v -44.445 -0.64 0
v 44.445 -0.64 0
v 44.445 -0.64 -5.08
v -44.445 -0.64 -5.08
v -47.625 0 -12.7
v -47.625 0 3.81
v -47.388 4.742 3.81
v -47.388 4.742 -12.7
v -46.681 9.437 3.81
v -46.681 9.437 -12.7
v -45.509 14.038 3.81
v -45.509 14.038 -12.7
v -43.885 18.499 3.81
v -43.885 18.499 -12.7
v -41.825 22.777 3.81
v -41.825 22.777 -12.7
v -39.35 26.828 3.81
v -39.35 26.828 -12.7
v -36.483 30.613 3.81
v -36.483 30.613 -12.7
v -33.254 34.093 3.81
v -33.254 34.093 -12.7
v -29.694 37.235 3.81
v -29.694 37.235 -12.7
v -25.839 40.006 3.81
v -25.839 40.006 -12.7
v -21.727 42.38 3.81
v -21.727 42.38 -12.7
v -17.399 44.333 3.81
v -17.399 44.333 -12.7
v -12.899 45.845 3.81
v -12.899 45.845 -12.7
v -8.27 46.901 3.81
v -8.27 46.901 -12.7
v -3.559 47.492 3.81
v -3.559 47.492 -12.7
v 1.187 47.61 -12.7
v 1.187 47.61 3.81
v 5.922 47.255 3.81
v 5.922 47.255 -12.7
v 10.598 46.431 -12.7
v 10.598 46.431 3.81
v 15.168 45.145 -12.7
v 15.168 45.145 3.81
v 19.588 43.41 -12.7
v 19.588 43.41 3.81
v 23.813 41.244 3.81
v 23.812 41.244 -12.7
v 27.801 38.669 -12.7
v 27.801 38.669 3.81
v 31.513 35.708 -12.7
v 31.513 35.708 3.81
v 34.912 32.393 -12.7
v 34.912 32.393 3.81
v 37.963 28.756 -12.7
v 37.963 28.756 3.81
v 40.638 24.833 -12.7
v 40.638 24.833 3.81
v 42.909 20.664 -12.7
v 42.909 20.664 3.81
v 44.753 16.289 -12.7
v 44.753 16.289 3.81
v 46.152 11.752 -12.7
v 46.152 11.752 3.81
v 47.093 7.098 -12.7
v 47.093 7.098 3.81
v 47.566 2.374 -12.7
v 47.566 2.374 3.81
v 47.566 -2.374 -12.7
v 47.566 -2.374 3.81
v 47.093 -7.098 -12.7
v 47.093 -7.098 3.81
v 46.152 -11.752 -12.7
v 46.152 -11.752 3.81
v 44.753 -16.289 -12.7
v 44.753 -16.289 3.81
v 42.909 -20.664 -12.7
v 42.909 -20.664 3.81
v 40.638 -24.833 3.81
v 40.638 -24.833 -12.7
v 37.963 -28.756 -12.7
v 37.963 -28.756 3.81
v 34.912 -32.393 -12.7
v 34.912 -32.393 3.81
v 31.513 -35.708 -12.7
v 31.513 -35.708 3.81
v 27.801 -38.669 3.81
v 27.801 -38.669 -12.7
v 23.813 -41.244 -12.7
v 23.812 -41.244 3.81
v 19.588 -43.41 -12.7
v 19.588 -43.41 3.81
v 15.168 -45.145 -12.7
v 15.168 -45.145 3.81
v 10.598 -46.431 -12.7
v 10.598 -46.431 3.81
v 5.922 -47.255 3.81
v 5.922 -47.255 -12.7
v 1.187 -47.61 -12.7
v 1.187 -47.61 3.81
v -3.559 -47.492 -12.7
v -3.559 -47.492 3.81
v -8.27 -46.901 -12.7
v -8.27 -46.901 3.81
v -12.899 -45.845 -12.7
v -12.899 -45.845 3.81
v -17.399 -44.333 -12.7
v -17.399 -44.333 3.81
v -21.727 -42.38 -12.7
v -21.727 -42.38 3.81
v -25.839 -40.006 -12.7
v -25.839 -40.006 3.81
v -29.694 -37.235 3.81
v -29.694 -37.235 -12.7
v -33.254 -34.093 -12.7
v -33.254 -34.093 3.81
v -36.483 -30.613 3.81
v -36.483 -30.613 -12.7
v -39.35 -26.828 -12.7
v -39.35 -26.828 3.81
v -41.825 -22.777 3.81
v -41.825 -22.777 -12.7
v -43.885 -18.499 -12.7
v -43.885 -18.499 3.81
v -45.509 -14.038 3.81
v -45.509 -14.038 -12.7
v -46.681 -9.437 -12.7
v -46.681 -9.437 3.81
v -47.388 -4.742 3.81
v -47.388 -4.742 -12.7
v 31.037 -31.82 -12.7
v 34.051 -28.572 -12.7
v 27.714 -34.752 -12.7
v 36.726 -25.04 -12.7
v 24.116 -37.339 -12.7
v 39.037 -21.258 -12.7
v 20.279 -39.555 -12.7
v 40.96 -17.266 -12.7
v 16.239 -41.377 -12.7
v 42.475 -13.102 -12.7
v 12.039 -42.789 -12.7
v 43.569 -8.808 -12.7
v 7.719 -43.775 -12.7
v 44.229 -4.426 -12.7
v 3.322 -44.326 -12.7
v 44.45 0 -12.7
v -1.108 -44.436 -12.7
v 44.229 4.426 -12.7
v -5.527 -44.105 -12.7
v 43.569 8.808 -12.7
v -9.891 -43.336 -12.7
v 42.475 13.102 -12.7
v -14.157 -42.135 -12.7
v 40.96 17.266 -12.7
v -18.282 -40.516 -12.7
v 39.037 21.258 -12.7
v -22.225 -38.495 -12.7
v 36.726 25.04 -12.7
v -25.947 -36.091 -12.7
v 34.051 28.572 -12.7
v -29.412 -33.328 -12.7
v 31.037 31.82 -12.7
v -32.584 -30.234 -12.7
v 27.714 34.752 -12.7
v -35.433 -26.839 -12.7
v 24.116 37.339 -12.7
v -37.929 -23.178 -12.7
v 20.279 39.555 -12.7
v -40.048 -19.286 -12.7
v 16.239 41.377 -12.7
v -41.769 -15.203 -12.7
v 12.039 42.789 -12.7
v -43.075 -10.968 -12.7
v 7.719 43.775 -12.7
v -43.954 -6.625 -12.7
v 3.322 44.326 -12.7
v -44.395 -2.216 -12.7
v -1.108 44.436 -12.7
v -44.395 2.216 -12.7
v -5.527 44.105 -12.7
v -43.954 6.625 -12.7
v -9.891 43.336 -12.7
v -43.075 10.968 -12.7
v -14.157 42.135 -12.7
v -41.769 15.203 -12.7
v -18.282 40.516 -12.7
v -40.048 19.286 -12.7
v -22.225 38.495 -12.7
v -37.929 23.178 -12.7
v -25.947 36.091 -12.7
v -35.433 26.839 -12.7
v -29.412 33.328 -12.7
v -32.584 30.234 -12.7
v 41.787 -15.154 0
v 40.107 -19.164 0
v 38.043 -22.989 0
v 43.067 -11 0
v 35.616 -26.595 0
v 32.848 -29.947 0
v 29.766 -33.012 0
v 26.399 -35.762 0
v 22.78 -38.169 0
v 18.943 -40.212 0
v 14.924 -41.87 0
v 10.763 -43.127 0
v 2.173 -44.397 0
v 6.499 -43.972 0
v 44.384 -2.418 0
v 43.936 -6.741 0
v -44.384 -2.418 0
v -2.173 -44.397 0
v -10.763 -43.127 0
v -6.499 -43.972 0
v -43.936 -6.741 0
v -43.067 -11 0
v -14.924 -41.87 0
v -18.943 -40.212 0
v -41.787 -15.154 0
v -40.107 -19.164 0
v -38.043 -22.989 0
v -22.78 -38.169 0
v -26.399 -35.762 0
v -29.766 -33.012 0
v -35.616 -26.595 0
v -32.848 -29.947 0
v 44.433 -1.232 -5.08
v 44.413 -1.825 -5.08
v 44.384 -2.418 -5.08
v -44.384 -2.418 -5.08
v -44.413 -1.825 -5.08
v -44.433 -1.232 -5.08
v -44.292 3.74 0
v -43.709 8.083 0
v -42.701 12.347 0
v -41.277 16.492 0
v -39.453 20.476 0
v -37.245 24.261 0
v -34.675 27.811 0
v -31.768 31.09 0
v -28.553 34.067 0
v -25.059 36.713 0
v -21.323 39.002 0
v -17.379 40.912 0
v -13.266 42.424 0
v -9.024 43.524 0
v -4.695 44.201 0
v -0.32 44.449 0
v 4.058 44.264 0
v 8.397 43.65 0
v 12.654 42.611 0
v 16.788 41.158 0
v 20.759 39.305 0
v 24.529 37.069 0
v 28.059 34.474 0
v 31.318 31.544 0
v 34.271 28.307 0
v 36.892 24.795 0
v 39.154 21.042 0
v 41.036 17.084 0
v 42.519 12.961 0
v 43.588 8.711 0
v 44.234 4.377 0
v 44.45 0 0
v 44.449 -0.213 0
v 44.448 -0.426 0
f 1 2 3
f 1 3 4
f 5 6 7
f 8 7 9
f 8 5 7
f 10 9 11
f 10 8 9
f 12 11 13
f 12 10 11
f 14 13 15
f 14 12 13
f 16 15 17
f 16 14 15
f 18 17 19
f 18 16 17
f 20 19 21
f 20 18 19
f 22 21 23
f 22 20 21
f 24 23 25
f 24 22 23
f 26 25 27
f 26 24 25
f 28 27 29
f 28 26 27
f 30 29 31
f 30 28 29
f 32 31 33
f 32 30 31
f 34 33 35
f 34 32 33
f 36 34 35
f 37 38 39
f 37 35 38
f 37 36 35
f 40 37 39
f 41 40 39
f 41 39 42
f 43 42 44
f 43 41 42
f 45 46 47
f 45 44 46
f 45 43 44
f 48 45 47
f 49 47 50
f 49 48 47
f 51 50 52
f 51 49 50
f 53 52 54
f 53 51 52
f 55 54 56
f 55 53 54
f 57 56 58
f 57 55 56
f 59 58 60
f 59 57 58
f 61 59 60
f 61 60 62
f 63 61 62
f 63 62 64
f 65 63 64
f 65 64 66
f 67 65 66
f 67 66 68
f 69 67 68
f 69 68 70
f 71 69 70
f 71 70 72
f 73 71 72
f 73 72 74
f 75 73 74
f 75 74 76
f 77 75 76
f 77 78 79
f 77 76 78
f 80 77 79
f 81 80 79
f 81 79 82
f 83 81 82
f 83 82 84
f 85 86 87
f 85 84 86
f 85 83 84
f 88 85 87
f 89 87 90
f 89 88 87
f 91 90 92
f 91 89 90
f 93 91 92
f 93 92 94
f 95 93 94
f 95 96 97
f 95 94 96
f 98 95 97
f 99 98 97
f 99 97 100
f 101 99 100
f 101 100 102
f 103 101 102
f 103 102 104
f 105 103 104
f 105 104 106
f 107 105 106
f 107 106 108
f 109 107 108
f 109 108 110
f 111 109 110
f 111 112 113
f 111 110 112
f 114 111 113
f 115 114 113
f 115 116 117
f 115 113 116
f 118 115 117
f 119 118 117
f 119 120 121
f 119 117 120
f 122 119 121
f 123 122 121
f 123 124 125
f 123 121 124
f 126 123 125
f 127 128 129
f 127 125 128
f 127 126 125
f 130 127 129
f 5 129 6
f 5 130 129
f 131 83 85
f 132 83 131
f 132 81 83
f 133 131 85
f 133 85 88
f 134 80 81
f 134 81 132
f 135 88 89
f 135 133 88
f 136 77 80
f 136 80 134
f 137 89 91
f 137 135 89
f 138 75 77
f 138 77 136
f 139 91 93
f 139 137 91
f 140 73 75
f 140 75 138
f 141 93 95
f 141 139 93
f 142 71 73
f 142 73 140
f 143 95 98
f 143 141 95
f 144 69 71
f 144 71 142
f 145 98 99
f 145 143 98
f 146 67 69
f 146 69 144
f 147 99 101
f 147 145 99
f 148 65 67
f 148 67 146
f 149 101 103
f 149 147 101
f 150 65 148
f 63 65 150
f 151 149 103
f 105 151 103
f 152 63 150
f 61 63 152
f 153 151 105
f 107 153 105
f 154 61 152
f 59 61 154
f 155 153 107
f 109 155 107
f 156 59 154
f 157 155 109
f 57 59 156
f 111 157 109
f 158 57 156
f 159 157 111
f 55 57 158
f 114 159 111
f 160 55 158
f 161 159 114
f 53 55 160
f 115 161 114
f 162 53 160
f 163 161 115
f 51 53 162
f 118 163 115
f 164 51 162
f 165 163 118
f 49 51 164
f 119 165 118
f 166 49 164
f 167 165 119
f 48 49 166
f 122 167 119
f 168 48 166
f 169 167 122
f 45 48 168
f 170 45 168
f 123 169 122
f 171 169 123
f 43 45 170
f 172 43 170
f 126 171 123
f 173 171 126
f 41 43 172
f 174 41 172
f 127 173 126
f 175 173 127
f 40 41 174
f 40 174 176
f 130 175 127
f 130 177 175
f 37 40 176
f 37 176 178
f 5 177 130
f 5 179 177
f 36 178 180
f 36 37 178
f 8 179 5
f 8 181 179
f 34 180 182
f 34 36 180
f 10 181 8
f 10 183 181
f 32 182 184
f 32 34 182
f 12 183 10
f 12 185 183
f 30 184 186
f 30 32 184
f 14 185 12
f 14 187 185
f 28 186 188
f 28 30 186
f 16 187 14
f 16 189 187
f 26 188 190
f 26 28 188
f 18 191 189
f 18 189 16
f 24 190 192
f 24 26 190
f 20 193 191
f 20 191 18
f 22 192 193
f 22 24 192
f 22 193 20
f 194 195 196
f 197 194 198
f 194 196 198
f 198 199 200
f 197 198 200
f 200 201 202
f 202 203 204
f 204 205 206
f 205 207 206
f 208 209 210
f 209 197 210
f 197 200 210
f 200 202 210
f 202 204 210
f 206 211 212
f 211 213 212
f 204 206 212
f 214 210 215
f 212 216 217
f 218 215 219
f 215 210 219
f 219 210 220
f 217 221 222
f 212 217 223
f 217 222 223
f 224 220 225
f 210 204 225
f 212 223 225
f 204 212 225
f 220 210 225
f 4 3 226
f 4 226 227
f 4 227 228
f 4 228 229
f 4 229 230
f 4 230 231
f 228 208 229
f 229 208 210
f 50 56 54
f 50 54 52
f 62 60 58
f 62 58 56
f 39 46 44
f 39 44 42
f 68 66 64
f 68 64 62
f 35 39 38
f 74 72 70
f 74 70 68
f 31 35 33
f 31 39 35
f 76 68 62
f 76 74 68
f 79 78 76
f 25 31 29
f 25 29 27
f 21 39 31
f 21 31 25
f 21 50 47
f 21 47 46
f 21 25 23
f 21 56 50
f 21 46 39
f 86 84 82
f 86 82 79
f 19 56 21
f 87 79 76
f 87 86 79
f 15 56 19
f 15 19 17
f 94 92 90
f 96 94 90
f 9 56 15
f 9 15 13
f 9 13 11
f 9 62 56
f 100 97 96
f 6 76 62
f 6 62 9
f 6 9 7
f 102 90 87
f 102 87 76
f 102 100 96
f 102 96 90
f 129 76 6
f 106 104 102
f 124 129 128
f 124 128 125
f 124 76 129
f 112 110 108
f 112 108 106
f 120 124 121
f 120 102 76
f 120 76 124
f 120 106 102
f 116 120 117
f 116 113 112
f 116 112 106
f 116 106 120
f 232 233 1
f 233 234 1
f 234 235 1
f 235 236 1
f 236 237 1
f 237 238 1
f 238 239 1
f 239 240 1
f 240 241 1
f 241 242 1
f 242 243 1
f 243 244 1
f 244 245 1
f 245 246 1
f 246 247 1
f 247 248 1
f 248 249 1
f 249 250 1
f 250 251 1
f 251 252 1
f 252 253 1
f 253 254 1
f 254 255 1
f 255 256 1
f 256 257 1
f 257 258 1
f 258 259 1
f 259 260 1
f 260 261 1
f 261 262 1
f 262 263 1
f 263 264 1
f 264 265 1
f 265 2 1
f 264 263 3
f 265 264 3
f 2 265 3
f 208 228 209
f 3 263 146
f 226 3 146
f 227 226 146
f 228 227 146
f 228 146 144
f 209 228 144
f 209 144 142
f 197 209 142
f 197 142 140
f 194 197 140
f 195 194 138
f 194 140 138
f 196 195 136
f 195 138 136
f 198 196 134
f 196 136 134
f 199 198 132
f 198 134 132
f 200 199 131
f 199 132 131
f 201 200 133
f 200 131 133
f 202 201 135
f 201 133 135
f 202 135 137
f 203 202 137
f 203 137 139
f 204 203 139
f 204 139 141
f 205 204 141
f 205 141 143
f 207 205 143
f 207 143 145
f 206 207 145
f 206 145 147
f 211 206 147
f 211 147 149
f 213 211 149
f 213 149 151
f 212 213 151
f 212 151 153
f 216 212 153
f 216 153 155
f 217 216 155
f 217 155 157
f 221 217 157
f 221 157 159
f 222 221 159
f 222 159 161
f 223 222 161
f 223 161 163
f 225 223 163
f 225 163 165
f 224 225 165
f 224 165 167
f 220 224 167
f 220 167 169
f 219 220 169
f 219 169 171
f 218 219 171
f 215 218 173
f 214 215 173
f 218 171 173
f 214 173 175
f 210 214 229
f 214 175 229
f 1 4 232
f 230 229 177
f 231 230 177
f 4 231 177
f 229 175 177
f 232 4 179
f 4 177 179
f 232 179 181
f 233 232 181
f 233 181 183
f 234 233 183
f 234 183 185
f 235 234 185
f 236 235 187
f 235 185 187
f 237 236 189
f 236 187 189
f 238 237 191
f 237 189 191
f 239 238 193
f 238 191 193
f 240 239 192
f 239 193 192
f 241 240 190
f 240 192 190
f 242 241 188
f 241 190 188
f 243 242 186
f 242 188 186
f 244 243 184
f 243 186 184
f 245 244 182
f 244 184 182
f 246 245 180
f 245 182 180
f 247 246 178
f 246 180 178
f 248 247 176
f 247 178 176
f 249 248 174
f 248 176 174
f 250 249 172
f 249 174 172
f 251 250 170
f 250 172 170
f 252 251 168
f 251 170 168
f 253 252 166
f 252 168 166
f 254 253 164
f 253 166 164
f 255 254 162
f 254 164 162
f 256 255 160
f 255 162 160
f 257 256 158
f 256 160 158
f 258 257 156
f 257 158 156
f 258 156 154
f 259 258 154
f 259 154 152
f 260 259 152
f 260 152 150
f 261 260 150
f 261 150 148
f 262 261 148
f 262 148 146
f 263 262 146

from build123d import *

# Parameters (mm, degrees)
SKETCH1_R            = 47.625
BOSS_EXTRUDE1_DEPTH  = 3.81
BOSS_EXTRUDE2_START  = 12.7
SKETCH4_R            = 47.625
SKETCH4_R_2          = 44.45
BOSS_EXTRUDE2_DEPTH  = 12.7
SKETCH7_W            = 88.9
SKETCH7_H            = 1.778
BOSS_EXTRUDE14_DEPTH = 5.08


with BuildPart() as part:
    # Sketch1 → Boss-Extrude1 (new body)
    with BuildSketch(Plane.XY):
        with Locations(Location((0, 0, 0), (0, 0, 180))):
            Circle(SKETCH1_R)
    extrude(amount=BOSS_EXTRUDE1_DEPTH)

    # Sketch4 → Boss-Extrude2 (add)
    with BuildSketch(Plane(origin=(0, 0, 0), x_dir=(-1, 0, 0), z_dir=(0, 0, -1)).offset(BOSS_EXTRUDE2_START)):
        Circle(SKETCH4_R)
        with Locations(Location((0, 0, 0), (0, 0, 180))):
            Circle(SKETCH4_R_2, mode=Mode.SUBTRACT)
    extrude(amount=-BOSS_EXTRUDE2_DEPTH)

    # Sketch7 → Boss-Extrude14 (add)
    with BuildSketch(Plane(origin=(0, 0, 0), x_dir=(-1, 0, 0), z_dir=(0, 0, -1))):
        with Locations((-0.004601407, -1.528565374)):
            Rectangle(SKETCH7_W, SKETCH7_H)
    extrude(amount=BOSS_EXTRUDE14_DEPTH)


solid = part.part
